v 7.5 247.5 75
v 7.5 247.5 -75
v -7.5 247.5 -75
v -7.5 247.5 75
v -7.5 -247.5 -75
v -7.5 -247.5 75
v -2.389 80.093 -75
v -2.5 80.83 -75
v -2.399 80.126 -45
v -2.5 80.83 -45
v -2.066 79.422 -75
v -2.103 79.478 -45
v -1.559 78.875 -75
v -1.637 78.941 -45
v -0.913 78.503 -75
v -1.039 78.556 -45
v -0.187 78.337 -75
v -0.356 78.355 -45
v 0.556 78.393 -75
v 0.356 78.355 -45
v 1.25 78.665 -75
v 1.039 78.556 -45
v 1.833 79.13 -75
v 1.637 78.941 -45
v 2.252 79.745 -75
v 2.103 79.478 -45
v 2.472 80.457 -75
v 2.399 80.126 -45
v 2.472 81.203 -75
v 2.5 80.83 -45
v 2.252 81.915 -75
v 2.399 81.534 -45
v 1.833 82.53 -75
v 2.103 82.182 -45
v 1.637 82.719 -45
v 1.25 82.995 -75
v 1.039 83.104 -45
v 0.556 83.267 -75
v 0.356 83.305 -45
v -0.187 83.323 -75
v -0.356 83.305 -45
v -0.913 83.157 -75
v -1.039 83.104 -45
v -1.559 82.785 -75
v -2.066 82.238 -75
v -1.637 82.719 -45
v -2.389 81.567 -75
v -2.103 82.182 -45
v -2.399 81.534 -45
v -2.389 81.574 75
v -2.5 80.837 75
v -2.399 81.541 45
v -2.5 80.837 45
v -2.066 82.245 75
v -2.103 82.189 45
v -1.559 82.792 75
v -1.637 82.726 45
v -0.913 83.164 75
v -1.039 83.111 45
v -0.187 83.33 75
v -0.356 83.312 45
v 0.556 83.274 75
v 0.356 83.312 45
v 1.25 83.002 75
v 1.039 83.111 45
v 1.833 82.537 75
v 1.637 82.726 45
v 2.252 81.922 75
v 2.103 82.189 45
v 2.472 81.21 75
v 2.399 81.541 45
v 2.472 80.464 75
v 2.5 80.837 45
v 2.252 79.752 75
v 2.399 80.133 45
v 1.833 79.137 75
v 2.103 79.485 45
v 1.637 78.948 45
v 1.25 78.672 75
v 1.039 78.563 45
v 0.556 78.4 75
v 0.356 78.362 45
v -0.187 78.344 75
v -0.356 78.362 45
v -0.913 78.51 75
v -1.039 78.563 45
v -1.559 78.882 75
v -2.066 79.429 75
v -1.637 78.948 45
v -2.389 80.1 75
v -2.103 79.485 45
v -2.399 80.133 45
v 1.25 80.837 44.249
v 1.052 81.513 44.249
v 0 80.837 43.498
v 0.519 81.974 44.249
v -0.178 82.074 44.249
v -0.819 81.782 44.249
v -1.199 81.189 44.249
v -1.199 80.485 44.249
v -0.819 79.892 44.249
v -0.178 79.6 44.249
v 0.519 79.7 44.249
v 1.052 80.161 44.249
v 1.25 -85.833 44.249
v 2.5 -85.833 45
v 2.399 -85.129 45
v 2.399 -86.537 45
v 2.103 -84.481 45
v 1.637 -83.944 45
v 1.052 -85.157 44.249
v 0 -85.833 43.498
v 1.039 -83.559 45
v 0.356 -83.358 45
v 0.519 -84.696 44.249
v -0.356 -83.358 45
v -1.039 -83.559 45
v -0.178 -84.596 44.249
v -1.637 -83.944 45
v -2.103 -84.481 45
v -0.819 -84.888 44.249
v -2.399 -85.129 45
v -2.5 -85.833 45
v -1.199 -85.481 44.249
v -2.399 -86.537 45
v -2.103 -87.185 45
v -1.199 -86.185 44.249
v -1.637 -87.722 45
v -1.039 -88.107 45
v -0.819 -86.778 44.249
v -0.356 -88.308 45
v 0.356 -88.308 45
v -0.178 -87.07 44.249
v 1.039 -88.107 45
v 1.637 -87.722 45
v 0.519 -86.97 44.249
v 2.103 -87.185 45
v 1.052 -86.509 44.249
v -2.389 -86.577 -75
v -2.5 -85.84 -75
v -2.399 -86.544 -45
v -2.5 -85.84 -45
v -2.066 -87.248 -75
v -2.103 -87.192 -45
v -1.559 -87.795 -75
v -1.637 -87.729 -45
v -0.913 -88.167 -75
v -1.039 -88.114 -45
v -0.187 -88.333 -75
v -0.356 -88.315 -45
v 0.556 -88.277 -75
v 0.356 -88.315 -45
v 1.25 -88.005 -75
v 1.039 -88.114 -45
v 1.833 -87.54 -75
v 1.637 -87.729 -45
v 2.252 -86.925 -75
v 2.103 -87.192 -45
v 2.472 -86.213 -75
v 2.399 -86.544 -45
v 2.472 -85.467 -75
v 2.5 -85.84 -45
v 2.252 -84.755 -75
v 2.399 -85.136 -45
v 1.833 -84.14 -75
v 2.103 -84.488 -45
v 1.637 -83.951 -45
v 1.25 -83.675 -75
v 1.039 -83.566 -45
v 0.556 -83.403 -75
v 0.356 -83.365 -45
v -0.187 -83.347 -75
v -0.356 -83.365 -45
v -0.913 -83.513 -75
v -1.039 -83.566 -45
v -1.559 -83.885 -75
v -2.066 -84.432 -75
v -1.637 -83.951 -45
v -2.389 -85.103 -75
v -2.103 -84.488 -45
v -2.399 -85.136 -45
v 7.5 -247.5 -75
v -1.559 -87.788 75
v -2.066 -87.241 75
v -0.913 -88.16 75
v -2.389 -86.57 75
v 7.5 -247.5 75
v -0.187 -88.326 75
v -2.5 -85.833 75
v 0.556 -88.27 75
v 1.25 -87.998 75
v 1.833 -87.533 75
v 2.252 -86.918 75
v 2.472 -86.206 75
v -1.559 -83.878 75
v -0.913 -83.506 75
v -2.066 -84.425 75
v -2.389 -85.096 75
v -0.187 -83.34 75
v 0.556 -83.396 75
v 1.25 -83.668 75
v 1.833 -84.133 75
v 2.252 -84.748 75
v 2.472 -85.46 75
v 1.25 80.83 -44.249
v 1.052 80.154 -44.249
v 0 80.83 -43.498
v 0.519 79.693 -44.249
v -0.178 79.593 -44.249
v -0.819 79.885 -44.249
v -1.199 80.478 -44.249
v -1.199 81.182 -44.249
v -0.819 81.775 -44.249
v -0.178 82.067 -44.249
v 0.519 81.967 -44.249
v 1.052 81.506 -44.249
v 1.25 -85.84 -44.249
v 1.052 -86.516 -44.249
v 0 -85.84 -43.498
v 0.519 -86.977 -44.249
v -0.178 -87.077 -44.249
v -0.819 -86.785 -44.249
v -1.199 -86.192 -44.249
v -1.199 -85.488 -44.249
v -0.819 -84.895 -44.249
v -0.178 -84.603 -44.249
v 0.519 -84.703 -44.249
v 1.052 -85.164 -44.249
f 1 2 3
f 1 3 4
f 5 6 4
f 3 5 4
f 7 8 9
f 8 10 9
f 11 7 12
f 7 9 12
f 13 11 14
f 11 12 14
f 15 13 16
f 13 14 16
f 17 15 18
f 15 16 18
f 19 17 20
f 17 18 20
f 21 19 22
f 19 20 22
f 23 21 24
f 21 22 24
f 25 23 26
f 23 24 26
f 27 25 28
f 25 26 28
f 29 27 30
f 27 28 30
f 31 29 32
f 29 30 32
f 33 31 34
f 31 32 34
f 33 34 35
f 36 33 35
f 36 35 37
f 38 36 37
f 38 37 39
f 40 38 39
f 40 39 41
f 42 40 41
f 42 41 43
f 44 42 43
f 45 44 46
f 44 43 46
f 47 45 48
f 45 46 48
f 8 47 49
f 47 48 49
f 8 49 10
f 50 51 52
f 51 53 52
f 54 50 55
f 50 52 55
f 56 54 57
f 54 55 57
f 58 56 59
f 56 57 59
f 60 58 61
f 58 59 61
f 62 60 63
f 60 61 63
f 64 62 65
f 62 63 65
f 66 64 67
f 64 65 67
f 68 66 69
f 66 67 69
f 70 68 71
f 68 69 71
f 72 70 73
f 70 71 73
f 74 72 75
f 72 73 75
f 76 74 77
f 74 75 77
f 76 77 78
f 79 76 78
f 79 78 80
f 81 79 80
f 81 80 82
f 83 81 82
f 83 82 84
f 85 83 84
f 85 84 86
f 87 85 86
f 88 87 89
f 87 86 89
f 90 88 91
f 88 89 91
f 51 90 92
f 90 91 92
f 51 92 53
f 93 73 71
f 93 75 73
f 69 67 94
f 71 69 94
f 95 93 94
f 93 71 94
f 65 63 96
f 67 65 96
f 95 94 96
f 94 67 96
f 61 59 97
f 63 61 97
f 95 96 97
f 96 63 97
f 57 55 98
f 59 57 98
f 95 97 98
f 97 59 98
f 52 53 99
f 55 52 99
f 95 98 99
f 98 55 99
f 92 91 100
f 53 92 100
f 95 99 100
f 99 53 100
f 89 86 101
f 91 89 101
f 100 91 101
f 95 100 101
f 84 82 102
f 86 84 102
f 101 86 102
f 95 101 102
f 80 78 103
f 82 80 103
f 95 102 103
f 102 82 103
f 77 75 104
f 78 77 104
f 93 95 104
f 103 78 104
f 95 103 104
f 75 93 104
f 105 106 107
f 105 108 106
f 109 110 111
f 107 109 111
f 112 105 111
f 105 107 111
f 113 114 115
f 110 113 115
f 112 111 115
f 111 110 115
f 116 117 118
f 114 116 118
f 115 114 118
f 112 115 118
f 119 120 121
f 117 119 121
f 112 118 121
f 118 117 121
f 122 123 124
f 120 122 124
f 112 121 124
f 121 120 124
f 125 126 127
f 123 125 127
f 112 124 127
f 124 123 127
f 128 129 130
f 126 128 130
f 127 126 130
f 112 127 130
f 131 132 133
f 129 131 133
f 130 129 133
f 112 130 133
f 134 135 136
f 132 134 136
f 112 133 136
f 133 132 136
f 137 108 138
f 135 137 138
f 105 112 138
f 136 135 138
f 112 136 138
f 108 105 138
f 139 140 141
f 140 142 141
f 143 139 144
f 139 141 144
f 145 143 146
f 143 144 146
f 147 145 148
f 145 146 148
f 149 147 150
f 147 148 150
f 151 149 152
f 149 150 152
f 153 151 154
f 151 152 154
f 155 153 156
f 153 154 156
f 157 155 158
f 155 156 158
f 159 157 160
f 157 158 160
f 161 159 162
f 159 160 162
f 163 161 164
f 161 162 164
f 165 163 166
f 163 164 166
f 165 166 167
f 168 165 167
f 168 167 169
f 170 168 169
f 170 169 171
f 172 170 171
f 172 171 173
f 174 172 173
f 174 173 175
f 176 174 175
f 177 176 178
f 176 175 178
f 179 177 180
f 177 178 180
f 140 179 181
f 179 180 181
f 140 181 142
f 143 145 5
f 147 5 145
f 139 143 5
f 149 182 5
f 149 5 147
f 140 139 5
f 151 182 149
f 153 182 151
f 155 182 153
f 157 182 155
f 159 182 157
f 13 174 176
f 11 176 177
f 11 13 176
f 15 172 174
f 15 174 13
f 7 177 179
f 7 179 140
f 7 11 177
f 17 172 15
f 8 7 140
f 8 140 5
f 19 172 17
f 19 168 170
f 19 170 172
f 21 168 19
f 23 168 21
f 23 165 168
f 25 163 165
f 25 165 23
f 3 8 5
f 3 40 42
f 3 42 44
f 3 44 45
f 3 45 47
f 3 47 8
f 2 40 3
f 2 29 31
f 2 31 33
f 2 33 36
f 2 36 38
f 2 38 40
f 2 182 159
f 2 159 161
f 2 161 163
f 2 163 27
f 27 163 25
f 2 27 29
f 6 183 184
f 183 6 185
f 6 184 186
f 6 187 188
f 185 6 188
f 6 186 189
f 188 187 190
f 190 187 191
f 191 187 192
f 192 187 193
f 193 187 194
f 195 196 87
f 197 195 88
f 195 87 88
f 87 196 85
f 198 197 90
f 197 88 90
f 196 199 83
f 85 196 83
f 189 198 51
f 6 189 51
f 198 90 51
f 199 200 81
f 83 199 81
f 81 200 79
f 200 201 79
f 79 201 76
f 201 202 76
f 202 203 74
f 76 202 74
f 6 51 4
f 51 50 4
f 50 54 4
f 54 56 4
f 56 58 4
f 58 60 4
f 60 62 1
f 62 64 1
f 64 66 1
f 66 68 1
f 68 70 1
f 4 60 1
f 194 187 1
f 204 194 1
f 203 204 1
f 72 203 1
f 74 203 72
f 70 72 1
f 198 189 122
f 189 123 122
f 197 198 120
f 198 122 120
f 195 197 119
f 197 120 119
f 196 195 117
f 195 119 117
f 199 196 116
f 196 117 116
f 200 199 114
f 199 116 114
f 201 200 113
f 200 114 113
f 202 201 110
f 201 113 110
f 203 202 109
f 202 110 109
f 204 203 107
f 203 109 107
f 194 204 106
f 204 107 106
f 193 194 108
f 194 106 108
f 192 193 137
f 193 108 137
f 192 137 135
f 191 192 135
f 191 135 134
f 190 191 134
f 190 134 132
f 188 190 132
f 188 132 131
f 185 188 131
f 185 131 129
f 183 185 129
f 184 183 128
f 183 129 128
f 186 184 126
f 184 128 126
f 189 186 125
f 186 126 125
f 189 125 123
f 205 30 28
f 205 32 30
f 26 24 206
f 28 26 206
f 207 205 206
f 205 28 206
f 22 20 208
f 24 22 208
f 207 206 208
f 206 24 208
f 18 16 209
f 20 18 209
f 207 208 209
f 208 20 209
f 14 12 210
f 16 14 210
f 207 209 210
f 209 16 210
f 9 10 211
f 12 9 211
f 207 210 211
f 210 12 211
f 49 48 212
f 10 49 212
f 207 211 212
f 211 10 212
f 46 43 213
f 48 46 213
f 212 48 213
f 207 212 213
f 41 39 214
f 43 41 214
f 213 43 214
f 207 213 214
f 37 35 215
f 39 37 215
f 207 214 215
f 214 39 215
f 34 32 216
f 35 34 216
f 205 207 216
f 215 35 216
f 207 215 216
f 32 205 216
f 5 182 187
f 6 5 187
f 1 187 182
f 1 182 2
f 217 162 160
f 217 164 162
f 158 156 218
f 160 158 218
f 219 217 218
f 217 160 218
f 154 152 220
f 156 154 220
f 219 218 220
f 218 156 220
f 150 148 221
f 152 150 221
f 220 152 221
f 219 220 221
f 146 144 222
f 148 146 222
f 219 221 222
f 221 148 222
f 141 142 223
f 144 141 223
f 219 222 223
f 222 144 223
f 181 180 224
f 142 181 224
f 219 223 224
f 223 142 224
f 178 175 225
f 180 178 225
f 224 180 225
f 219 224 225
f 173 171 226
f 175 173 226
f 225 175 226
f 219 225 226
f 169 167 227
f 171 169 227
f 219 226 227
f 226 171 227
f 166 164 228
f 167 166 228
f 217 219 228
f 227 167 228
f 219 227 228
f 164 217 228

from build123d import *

# Parameters (mm, degrees)
F0_W           = 495
F0_H           = 150
F1_DEPTH       = 7.5
F4_D           = 5
F4_DEPTH       = 30
F4_TIP         = 1.5021515476
F4_ON_F3_D     = 5
F4_ON_F3_DEPTH = 30
F4_ON_F3_TIP   = 1.5021515476


with BuildPart() as f1:
    # F0 (on Right) → F1 (new body, symmetric)
    with BuildSketch(Plane.YZ):
        Rectangle(F0_W, F0_H)
    extrude(amount=F1_DEPTH, both=True)

    # F4
    with Locations(Plane.XY.offset(75)):
        with Locations((0, 80.837), (0, -85.833)):
            Hole(F4_D / 2, depth=F4_DEPTH)
            with Locations((0, 0, -(F4_DEPTH + F4_TIP / 2))):  # 118° drill point
                Cone(0, F4_D / 2, F4_TIP, mode=Mode.SUBTRACT)

    # F4 on F3
    with Locations(Plane(origin=(0, 0, -75), x_dir=(1, 0, 0), z_dir=(0, 0, -1))):
        with Locations((0, 85.84), (0, -80.83)):
            Hole(F4_ON_F3_D / 2, depth=F4_ON_F3_DEPTH)
            with Locations((0, 0, -(F4_ON_F3_DEPTH + F4_ON_F3_TIP / 2))):  # 118° drill point
                Cone(0, F4_ON_F3_D / 2, F4_ON_F3_TIP, mode=Mode.SUBTRACT)


solid = f1.part
